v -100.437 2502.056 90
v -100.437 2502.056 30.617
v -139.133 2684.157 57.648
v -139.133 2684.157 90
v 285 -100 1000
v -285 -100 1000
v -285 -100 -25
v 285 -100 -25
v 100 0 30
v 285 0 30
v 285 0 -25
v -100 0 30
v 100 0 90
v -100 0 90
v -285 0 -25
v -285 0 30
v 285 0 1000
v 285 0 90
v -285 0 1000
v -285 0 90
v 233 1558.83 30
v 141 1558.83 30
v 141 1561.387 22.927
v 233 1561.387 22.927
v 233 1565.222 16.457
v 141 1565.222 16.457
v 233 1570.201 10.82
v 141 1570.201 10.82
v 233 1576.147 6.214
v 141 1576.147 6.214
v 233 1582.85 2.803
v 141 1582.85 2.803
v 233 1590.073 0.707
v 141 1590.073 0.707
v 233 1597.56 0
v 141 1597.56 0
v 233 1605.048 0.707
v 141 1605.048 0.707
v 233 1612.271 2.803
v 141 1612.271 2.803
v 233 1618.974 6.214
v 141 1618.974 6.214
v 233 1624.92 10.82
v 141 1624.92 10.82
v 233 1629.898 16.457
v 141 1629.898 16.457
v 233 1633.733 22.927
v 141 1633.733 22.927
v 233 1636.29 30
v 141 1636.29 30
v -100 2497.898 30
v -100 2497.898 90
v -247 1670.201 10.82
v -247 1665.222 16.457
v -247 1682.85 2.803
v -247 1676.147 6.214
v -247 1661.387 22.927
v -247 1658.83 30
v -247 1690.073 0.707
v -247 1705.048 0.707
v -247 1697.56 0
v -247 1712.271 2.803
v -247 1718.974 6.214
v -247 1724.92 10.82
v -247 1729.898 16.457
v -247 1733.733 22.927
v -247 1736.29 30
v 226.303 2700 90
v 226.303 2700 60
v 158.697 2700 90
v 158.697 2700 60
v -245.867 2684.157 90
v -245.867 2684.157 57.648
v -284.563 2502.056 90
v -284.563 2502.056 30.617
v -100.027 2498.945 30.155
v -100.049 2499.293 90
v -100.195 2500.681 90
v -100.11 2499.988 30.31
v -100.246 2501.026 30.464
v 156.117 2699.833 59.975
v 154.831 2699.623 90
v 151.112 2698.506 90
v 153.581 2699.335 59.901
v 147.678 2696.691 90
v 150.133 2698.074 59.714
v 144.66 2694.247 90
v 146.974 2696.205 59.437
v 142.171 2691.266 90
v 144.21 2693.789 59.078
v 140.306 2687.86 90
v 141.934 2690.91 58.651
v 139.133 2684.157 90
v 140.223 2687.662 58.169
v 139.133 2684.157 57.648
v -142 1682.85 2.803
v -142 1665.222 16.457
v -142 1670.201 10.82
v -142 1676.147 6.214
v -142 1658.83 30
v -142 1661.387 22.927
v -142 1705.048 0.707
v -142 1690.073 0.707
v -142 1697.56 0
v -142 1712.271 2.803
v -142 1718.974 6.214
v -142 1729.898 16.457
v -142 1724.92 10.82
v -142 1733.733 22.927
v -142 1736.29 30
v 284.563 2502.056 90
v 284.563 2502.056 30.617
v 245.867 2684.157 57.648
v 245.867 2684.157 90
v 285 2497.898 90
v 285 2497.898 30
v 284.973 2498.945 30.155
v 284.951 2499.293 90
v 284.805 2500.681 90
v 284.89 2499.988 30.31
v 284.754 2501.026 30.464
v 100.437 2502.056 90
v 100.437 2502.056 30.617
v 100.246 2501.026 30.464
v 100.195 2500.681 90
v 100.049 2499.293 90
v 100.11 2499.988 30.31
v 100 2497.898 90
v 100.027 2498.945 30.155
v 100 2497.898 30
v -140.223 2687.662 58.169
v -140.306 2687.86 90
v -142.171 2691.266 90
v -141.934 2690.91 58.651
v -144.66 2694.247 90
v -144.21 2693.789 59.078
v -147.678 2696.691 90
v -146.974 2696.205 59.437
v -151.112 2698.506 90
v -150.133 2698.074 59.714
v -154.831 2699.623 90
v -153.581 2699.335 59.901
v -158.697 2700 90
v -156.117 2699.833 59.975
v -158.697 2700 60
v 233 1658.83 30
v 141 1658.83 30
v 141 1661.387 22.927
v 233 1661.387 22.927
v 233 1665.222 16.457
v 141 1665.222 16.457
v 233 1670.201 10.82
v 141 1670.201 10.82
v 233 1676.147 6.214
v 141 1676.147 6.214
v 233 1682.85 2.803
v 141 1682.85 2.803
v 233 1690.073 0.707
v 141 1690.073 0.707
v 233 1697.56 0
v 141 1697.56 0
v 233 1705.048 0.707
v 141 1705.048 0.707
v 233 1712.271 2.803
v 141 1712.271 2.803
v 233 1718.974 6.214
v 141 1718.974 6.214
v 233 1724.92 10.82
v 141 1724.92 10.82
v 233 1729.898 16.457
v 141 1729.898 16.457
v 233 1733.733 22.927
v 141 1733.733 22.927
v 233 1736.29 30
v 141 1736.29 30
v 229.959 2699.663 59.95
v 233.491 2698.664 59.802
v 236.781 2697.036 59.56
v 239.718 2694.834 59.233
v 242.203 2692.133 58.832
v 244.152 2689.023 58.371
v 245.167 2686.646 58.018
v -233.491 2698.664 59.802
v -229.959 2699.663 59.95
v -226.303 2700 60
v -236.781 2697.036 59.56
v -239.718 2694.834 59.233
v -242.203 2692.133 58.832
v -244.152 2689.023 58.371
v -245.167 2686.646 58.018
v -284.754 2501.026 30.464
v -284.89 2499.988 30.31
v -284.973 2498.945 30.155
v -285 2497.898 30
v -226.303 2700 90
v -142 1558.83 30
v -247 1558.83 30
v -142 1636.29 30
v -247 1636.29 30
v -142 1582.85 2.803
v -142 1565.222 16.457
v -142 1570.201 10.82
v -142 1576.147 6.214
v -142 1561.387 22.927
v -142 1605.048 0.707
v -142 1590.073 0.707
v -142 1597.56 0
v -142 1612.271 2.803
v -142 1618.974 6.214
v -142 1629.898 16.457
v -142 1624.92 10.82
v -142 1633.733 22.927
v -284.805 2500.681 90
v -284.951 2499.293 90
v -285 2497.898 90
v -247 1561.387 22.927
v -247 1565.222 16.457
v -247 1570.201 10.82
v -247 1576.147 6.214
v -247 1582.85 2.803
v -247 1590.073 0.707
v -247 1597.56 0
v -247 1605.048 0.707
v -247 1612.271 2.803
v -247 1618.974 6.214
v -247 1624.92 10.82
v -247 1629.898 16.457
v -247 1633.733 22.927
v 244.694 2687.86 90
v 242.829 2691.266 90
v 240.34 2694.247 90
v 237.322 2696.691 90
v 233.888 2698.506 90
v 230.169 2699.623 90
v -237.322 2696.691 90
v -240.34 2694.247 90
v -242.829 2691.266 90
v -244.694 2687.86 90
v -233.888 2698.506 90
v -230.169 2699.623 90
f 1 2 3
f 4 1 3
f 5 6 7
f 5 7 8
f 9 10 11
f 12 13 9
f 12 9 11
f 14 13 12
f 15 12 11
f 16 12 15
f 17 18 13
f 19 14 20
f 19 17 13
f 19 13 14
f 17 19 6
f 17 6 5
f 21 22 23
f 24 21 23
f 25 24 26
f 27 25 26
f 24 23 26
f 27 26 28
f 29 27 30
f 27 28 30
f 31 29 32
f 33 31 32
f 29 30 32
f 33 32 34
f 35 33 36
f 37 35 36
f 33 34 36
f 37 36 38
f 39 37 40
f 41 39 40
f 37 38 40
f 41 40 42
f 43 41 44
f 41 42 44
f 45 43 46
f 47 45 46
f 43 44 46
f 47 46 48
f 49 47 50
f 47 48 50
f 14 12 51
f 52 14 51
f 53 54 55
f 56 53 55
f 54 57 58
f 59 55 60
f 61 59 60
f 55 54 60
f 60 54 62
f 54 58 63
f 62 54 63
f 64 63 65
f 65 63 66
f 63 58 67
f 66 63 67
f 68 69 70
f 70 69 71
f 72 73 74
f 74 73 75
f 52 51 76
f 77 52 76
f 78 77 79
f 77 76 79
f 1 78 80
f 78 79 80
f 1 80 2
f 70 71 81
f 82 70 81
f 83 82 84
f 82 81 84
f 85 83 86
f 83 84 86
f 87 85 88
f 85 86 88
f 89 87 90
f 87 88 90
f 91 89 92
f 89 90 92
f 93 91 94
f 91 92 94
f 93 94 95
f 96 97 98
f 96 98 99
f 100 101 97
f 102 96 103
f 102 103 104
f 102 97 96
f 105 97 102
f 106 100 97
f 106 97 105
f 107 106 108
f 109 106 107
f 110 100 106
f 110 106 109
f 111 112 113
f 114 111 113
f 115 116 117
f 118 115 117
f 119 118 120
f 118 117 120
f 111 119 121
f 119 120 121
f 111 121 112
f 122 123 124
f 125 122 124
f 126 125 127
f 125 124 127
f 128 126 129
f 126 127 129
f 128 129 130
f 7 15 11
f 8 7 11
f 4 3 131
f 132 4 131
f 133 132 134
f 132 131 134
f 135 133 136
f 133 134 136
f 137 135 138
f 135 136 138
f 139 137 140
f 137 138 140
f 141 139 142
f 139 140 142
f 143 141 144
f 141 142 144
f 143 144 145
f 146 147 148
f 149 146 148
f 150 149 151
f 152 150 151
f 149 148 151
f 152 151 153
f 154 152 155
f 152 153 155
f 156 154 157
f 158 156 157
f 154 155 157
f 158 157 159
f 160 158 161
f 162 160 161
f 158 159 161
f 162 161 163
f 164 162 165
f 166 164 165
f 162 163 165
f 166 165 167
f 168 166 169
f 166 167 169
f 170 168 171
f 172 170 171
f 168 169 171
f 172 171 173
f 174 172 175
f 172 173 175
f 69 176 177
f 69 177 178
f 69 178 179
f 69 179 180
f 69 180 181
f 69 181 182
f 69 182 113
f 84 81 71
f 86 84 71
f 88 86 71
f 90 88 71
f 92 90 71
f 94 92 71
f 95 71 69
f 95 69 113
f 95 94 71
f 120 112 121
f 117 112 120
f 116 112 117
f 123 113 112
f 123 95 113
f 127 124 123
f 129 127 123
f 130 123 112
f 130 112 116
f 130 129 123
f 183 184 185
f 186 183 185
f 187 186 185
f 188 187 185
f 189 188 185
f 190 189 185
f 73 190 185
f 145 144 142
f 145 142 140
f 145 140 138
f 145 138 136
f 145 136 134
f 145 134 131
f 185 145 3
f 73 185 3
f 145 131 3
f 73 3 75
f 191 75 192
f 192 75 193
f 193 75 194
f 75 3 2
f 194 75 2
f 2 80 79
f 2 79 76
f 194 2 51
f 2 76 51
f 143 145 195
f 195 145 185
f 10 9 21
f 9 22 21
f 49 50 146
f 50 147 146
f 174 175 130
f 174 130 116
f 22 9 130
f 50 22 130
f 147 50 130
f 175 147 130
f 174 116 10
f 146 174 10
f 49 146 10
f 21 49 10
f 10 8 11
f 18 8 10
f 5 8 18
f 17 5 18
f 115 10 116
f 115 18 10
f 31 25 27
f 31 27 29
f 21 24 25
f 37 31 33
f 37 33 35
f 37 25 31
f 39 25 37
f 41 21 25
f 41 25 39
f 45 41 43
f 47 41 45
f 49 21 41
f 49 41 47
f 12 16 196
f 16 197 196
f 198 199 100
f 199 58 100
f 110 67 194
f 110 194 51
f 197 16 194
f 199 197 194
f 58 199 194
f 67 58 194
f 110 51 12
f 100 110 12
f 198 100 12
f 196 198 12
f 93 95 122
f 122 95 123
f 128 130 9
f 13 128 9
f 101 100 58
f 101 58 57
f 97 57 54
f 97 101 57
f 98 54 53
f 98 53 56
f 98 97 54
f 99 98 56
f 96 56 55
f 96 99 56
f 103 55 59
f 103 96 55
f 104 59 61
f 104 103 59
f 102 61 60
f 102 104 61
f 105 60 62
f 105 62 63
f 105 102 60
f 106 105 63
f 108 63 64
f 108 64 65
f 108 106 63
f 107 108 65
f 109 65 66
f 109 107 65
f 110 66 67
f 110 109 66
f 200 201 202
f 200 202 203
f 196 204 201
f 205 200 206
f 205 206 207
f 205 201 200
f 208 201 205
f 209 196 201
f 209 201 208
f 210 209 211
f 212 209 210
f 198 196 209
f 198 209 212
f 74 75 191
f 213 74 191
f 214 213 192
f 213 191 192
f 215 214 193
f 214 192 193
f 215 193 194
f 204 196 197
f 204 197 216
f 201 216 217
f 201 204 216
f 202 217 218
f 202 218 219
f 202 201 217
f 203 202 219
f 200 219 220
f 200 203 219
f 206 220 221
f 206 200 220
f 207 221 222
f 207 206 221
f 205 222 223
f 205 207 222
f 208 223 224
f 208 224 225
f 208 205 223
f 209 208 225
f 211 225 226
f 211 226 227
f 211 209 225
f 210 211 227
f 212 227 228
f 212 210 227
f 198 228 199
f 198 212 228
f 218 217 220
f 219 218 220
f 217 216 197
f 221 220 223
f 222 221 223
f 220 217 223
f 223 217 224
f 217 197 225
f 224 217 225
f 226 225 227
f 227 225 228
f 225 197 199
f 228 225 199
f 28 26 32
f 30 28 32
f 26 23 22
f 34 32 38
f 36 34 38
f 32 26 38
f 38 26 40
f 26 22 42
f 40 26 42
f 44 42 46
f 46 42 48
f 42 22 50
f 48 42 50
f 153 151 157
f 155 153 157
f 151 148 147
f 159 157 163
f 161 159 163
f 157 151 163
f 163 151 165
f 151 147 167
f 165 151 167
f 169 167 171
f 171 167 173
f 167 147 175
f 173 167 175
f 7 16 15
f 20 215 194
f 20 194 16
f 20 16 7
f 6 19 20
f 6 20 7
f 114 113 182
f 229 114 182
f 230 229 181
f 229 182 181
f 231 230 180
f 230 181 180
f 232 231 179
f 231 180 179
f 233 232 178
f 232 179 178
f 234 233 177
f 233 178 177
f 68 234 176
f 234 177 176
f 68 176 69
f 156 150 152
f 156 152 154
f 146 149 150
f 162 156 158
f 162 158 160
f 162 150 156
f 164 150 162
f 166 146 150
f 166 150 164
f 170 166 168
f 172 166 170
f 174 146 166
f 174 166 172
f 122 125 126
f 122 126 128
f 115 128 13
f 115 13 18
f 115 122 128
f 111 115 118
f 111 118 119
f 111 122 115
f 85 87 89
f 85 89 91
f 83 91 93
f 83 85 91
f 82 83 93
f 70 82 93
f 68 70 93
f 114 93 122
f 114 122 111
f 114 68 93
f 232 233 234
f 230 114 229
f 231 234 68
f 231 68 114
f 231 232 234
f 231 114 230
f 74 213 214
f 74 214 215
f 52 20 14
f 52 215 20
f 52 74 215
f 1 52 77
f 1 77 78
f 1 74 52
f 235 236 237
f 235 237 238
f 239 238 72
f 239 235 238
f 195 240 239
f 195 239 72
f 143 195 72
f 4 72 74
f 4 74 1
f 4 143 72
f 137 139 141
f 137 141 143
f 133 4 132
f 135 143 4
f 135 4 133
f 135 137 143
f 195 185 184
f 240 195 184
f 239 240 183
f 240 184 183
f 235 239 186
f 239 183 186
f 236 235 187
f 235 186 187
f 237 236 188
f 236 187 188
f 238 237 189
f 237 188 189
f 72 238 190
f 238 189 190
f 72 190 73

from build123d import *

# Parameters (mm, degrees)
F1_START      = 30
F1_DEPTH      = 60
F2_DEPTH      = 1000
F2_DEPTH_BACK = 25
F4_START      = 141
F4_DEPTH      = 92
F5_START      = -142
F5_DEPTH      = 105
F7_DEPTH      = 285.001
F7_DEPTH_BACK = 285.001


with BuildPart() as f1:
    # F0 (on Top) → F1 (new body)
    with BuildSketch(Plane.XY.offset(F1_START)):
        with BuildLine():
            Line((-192.5, 0), (-100, 0))
            Line((-100, 0), (-100, 2497.8984624443))
            ThreePointArc((-100, 2497.8984624443), (-100.1095055319, 2499.9884935006), (-100.4368229816, 2502.0556375607))
            Line((-100.4368229816, 2502.0556375607), (-139.1333997122, 2684.1571751164))
            ThreePointArc((-139.1333997122, 2684.1571751164), (-146.1097483439, 2695.5425786523), (-158.6965767306, 2700))
            Line((-158.6965767306, 2700), (-192.5, 2700))
            Line((-192.5, 2700), (-226.3034232694, 2700))
            ThreePointArc((-226.3034232694, 2700), (-238.8902516561, 2695.5425786523), (-245.8666002878, 2684.1571751164))
            Line((-245.8666002878, 2684.1571751164), (-284.5631770184, 2502.0556375607))
            ThreePointArc((-284.5631770184, 2502.0556375607), (-284.8904944681, 2499.9884935006), (-285, 2497.8984624443))
            Line((-285, 2497.8984624443), (-285, 0))
            Line((-285, 0), (-192.5, 0))
        make_face()
        Polygon((100, 0), (-100, 0), (-192.5, 0), (-285, 0), (-285, -100), (285, -100), (285, 0), (192.5, 0), align=None)
        with BuildLine():
            Line((100, 2497.8984624443), (100, 0))
            Line((100, 0), (192.5, 0))
            Line((192.5, 0), (285, 0))
            Line((285, 0), (285, 2497.8984624443))
            ThreePointArc((285, 2497.8984624443), (284.8904944681, 2499.9884935006), (284.5631770184, 2502.0556375607))
            Line((284.5631770184, 2502.0556375607), (245.8666002878, 2684.1571751164))
            ThreePointArc((245.8666002878, 2684.1571751164), (238.8902516561, 2695.5425786523), (226.3034232694, 2700))
            Line((226.3034232694, 2700), (192.5, 2700))
            Line((192.5, 2700), (158.6965767306, 2700))
            ThreePointArc((158.6965767306, 2700), (146.1097483439, 2695.5425786523), (139.1333997122, 2684.1571751164))
            Line((139.1333997122, 2684.1571751164), (100.4368229816, 2502.0556375607))
            ThreePointArc((100.4368229816, 2502.0556375607), (100.1095055319, 2499.9884935006), (100, 2497.8984624443))
        make_face()
    extrude(amount=F1_DEPTH)

    # F0 (on Top) → F2 (join, two sides)
    with BuildSketch(Plane.XY) as f2_sk:
        Polygon((100, 0), (-100, 0), (-192.5, 0), (-285, 0), (-285, -100), (285, -100), (285, 0), (192.5, 0), align=None)
    extrude(amount=F2_DEPTH)
    extrude(f2_sk.sketch, amount=-F2_DEPTH_BACK)

    # F3 (on Right) → F4 (join)
    with BuildSketch(Plane.YZ.offset(F4_START)):
        with BuildLine():
            Line((1736.2900083932, 30), (1658.8303414691, 30))
            ThreePointArc((1658.8303414691, 30), (1697.5601749311, 0), (1736.2900083932, 30))
        make_face()
        with BuildLine():
            Line((1636.2900083932, 30), (1558.8303414691, 30))
            ThreePointArc((1558.8303414691, 30), (1597.5601749311, 0), (1636.2900083932, 30))
        make_face()
    extrude(amount=F4_DEPTH)

    # F3 (on Right) → F5 (join)
    with BuildSketch(Plane.YZ.offset(F5_START)):
        with BuildLine():
            Line((1636.2900083932, 30), (1558.8303414691, 30))
            ThreePointArc((1558.8303414691, 30), (1597.5601749311, 0), (1636.2900083932, 30))
        make_face()
        with BuildLine():
            Line((1736.2900083932, 30), (1658.8303414691, 30))
            ThreePointArc((1658.8303414691, 30), (1697.5601749311, 0), (1736.2900083932, 30))
        make_face()
    extrude(amount=-F5_DEPTH)

    # F6 (on Right) → F7 (cut, two sides)
    with BuildSketch(Plane.YZ) as f7_sk:
        Polygon((2700, 30), (2700, 60), (2497.8984624443, 30), align=None)
    extrude(amount=-F7_DEPTH, mode=Mode.SUBTRACT)
    extrude(f7_sk.sketch, amount=F7_DEPTH_BACK, mode=Mode.SUBTRACT)


solid = f1.part
